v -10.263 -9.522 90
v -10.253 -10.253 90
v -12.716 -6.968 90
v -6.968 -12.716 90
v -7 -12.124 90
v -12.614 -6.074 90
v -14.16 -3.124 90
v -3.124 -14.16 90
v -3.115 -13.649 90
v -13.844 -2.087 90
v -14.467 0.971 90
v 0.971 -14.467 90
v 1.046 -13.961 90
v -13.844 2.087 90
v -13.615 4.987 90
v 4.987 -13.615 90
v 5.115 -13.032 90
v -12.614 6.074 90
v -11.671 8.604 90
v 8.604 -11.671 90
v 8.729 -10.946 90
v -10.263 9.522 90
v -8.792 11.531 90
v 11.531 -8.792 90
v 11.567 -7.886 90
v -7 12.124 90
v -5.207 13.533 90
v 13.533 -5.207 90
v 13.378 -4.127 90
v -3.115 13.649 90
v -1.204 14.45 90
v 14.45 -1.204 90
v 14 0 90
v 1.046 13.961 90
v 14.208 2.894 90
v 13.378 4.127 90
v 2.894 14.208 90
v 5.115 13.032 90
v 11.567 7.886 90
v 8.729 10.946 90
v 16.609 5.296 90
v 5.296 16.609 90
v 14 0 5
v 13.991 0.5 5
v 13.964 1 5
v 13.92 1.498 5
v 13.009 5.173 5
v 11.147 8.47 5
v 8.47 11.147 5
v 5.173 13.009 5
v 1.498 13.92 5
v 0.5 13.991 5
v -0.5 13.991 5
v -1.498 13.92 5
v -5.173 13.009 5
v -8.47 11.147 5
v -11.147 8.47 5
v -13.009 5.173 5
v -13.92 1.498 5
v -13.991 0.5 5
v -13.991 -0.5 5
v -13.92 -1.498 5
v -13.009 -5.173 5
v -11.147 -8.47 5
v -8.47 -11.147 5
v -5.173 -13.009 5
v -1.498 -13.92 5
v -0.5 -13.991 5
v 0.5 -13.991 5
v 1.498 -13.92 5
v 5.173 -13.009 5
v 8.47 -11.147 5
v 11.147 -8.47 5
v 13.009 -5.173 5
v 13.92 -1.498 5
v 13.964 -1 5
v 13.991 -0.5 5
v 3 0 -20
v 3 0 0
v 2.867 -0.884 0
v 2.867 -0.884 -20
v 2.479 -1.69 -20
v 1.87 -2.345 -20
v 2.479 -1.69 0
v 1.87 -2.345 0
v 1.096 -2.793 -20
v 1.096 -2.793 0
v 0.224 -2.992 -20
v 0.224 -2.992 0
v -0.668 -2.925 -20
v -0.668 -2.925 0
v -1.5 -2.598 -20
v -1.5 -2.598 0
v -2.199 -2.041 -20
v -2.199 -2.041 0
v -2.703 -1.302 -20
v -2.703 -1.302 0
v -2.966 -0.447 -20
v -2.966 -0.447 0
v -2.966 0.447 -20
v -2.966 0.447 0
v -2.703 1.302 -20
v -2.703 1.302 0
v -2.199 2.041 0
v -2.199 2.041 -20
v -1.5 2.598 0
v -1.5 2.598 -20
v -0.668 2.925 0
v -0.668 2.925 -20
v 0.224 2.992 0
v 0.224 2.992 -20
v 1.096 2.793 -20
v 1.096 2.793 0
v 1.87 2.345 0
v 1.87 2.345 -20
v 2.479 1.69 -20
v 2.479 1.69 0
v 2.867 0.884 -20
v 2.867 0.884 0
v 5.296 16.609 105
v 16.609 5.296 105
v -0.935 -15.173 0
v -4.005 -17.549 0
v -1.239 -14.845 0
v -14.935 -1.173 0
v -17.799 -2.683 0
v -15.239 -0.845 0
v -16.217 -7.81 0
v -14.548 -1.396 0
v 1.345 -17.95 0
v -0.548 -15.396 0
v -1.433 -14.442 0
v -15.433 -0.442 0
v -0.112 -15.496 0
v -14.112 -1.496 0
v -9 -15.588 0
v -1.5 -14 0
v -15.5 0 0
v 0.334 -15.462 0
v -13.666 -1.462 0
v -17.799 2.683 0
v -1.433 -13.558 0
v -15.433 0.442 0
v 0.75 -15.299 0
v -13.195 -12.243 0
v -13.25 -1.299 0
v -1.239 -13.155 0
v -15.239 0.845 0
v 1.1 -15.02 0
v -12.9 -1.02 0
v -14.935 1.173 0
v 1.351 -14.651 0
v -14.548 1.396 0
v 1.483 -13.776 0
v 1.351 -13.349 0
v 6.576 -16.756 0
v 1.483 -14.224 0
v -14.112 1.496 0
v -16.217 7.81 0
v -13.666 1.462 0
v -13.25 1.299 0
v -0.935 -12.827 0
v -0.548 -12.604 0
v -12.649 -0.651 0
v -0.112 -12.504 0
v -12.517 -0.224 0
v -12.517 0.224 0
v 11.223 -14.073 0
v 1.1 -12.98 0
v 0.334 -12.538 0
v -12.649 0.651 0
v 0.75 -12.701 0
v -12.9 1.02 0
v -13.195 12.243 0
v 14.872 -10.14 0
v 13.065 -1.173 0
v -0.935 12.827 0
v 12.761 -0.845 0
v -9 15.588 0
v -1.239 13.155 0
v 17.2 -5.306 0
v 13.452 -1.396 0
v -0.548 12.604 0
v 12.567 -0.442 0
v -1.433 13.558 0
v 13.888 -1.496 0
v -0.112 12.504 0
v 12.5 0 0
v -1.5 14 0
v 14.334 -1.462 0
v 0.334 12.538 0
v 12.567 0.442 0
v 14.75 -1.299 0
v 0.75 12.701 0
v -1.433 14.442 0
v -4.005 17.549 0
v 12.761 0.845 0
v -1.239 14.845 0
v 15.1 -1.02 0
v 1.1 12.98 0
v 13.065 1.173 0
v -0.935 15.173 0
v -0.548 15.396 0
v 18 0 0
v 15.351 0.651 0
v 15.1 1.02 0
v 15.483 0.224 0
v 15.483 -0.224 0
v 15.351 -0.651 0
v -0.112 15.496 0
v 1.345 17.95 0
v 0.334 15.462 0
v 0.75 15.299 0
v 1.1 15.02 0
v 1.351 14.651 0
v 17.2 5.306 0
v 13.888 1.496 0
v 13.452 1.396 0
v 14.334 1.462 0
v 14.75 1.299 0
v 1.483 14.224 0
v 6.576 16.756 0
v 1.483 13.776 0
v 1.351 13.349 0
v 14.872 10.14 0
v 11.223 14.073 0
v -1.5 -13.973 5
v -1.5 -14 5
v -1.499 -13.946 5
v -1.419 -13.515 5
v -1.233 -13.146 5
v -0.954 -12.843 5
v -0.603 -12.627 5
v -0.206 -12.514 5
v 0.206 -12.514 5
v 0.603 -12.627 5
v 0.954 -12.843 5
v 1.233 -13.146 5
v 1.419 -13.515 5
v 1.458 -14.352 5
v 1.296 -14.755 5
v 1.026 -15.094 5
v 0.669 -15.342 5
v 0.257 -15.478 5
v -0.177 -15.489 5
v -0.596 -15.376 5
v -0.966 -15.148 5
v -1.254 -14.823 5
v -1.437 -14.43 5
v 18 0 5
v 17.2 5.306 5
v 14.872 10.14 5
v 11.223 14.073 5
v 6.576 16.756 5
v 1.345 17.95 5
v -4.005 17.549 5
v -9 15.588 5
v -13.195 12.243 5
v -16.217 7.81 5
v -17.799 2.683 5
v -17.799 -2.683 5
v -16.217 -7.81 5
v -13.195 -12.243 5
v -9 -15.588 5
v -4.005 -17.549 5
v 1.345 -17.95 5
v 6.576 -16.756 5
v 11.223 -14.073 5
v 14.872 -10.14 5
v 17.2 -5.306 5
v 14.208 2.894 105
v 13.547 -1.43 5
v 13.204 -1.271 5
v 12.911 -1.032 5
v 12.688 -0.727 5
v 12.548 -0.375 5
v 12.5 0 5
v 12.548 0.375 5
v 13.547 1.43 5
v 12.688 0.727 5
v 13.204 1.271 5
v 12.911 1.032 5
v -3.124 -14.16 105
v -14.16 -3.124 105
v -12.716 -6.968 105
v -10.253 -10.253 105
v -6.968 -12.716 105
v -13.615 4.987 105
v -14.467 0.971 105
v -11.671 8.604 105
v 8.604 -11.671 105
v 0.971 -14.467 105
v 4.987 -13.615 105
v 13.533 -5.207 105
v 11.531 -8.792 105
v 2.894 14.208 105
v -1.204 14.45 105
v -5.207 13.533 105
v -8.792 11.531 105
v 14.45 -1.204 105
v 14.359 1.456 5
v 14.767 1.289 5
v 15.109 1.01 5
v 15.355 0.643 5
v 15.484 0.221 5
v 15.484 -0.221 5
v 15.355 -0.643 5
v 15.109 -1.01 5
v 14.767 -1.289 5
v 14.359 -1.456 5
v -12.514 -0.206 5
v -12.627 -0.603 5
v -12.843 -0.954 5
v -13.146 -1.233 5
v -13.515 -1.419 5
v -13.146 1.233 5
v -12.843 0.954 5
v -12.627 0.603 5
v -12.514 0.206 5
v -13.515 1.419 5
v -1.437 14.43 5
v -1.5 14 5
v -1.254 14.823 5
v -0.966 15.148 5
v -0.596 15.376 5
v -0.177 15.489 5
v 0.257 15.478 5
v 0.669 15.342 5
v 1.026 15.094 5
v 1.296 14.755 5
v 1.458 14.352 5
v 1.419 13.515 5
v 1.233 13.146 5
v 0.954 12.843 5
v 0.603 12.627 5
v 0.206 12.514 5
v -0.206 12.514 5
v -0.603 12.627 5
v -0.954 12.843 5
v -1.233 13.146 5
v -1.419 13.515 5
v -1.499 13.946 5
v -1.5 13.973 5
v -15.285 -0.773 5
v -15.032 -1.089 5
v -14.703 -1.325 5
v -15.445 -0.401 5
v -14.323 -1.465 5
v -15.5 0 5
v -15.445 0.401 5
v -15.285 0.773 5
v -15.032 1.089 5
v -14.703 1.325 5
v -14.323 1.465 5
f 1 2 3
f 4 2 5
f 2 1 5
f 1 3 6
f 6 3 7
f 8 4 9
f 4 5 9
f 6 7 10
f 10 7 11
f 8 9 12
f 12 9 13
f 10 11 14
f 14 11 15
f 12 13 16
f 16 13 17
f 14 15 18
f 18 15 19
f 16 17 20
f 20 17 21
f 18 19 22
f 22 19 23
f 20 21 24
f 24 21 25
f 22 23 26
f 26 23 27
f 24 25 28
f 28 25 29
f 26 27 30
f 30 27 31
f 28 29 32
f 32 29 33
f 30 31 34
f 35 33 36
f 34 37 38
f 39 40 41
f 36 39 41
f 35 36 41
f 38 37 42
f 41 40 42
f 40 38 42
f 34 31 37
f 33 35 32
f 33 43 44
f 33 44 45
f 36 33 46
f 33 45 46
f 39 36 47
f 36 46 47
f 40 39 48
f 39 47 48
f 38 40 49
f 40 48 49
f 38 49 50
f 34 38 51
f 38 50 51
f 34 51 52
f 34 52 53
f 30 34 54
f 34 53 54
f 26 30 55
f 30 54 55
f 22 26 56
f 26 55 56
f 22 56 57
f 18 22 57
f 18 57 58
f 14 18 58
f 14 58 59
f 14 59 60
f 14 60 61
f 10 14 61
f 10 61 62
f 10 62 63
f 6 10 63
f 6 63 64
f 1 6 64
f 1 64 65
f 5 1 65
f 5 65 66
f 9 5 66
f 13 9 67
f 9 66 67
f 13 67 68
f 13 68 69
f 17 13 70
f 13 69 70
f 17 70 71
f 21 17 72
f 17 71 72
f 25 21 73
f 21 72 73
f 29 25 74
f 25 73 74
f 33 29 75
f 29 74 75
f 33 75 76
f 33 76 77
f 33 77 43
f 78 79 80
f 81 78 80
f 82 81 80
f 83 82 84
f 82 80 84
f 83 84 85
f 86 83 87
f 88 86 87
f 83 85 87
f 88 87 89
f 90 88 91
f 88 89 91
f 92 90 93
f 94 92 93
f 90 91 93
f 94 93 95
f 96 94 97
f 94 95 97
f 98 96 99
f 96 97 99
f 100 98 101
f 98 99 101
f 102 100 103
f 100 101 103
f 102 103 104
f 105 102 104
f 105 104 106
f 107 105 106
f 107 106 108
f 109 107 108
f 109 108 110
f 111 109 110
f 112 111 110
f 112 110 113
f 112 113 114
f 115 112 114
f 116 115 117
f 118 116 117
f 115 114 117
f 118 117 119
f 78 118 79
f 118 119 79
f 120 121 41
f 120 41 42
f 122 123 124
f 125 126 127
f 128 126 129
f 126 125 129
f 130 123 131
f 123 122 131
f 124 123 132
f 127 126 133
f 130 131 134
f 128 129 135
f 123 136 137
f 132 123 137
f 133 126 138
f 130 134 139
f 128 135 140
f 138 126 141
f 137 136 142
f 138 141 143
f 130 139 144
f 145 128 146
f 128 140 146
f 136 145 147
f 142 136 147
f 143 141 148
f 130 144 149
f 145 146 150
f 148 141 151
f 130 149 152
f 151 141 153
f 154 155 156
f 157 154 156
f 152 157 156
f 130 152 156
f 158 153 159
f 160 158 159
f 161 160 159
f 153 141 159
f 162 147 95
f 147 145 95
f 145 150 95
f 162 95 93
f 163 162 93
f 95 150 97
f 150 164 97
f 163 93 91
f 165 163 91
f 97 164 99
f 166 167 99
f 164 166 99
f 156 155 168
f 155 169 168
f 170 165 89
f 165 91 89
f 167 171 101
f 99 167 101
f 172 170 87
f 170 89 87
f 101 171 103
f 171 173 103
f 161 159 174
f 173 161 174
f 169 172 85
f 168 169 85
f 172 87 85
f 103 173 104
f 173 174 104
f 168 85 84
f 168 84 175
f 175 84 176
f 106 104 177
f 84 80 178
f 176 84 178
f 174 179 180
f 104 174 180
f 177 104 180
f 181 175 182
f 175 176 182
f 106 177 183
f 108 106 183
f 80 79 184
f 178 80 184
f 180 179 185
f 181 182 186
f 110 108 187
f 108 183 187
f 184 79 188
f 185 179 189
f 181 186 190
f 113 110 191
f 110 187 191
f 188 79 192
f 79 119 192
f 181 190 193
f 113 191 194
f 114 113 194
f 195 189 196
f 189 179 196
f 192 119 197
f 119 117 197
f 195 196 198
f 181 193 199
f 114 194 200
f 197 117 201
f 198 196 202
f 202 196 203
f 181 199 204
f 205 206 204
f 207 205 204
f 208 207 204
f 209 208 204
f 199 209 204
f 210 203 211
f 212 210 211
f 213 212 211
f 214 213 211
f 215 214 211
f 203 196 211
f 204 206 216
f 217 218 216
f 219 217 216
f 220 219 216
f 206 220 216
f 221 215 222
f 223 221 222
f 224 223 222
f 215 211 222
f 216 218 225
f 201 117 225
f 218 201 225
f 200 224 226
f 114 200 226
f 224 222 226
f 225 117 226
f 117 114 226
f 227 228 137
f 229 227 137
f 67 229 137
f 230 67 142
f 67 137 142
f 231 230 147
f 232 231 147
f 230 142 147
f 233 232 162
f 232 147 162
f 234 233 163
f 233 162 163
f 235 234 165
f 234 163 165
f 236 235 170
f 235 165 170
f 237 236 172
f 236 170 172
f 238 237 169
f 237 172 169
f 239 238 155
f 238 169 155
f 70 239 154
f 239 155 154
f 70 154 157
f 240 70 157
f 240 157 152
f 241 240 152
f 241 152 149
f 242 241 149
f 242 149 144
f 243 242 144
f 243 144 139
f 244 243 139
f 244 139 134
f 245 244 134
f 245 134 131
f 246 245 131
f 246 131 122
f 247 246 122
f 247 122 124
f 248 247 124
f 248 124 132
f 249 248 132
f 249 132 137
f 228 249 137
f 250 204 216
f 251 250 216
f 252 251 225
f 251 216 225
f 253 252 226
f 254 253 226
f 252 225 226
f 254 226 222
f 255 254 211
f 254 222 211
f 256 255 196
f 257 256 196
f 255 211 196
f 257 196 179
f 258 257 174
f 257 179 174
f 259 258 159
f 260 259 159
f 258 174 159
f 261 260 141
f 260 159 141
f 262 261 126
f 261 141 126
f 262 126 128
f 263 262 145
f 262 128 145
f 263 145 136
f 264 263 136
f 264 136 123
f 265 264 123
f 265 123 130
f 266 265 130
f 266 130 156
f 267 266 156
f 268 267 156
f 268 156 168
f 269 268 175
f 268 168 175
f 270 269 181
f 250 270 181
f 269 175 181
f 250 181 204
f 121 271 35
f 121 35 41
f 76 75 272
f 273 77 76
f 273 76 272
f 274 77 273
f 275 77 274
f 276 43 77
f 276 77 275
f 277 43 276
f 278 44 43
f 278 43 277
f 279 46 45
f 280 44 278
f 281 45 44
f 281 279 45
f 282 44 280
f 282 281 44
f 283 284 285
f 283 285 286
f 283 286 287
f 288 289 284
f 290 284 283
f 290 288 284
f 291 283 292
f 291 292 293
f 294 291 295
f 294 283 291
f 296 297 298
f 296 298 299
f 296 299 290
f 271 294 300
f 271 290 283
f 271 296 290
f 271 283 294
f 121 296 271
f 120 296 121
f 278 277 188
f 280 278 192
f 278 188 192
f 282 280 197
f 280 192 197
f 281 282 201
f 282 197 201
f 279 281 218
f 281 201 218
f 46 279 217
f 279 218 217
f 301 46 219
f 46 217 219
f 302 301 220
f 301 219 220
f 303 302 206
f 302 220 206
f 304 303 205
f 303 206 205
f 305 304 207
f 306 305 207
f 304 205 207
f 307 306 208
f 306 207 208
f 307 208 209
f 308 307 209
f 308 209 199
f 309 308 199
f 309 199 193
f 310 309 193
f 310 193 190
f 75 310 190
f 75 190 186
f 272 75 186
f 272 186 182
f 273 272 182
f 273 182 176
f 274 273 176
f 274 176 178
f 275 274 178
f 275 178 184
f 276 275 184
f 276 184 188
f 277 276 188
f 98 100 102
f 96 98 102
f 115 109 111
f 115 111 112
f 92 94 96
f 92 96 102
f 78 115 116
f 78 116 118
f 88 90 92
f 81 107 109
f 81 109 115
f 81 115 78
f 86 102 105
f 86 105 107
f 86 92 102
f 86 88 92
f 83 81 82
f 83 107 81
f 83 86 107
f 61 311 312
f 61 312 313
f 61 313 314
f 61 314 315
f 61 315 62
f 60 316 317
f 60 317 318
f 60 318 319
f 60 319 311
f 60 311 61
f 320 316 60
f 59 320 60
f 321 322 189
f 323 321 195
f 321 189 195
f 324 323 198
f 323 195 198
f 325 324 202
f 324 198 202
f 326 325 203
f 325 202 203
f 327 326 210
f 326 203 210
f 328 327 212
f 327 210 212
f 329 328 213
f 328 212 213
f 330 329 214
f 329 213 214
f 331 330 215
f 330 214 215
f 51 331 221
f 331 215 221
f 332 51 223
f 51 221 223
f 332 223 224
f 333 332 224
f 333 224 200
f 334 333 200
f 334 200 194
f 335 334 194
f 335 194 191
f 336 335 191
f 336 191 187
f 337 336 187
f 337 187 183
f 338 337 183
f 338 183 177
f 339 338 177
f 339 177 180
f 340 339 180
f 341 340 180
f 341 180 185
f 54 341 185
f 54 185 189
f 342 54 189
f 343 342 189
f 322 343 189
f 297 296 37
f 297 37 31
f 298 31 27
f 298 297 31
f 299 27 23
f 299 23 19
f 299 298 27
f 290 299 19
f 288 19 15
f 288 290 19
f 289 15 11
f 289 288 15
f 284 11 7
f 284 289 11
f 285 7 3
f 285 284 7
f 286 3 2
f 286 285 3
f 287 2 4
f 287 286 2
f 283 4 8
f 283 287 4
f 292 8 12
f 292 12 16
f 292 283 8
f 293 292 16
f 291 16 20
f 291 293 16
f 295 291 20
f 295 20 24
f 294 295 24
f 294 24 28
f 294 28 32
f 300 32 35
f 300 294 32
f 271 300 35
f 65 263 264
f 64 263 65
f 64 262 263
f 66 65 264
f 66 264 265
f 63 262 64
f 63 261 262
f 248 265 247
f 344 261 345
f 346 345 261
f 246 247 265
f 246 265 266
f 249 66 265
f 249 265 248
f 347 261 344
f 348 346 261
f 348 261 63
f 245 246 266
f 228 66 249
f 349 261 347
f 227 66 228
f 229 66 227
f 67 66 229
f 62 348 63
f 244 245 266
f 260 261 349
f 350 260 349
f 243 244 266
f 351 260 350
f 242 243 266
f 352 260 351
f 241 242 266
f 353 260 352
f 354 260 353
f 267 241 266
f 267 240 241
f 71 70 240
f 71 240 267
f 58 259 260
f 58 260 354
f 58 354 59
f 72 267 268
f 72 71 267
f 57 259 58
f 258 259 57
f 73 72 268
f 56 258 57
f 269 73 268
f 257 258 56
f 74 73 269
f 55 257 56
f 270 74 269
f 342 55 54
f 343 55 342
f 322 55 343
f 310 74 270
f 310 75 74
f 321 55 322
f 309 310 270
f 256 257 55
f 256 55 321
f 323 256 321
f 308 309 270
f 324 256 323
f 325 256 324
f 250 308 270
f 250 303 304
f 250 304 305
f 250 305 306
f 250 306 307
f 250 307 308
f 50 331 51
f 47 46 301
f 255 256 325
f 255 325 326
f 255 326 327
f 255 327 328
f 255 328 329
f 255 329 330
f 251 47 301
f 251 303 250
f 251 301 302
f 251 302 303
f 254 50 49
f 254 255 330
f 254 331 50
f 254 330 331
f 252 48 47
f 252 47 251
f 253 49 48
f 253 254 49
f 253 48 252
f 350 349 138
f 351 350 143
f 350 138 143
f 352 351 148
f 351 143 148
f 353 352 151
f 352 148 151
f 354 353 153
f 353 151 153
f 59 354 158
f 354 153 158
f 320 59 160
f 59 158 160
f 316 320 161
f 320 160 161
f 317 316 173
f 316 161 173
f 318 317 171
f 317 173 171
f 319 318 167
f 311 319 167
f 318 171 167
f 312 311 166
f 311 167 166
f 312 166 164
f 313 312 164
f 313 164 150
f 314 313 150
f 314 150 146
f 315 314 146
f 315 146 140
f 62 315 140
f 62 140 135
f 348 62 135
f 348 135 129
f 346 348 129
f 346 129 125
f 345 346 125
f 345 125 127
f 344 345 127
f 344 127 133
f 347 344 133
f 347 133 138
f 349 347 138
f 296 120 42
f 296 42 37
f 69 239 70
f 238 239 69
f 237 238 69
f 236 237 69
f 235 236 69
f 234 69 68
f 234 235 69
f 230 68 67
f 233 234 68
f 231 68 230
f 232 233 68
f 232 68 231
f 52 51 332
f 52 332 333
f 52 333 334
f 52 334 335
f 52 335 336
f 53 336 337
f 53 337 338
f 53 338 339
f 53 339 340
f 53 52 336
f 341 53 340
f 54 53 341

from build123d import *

# Parameters (mm, degrees)
SKETCH1_R           = 18
BOSS_EXTRUDE1_DEPTH = 5
SKETCH2_R           = 14
BOSS_EXTRUDE2_DEPTH = 100
BOSS_EXTRUDE3_DEPTH = 15
SKETCH4_R           = 1.5
CUT_EXTRUDE1_DEPTH  = 5
SKETCH5_R           = 3
BOSS_EXTRUDE4_DEPTH = 20


with BuildPart() as part:
    # Sketch1 → Boss-Extrude1 (new body)
    with BuildSketch(Plane.XY):
        Circle(SKETCH1_R)
    extrude(amount=BOSS_EXTRUDE1_DEPTH)

    # Sketch2 → Boss-Extrude2 (add)
    with BuildSketch(Plane.XY.offset(5)):
        Circle(SKETCH2_R)
    extrude(amount=BOSS_EXTRUDE2_DEPTH)

    # Sketch3 → Boss-Extrude3 (add)
    with BuildSketch(Plane.XY.offset(105)):
        with BuildLine():
            Line((16.609319779, 5.29561128), (5.29561128, 16.609319779))
            Line((5.29561128, 16.609319779), (2.894461439, 14.208169938))
            ThreePointArc((2.894461439, 14.208169938), (-10.253048327, -10.253048327), (14.208169938, 2.894461439))
            Line((14.208169938, 2.894461439), (16.609319779, 5.29561128))
        make_face()
    extrude(amount=-BOSS_EXTRUDE3_DEPTH)

    # Sketch4 → Cut-Extrude1 (cut)
    with BuildSketch(Plane(origin=(0, 0, 0), x_dir=(-1, 0, 0), z_dir=(0, 0, -1))):
        with Locations((0, 14)):
            Circle(SKETCH4_R)
        with Locations((14, 0)):
            Circle(SKETCH4_R)
        with Locations((0, -14)):
            Circle(SKETCH4_R)
        with Locations((-14, 0)):
            Circle(SKETCH4_R)
    extrude(amount=-CUT_EXTRUDE1_DEPTH, mode=Mode.SUBTRACT)

    # Sketch5 → Boss-Extrude4 (add)
    with BuildSketch(Plane(origin=(0, 0, 0), x_dir=(-1, 0, 0), z_dir=(0, 0, -1))):
        with Locations(Location((0, 0, 0), (0, 0, 180))):
            Circle(SKETCH5_R)
    extrude(amount=BOSS_EXTRUDE4_DEPTH)


solid = part.part
